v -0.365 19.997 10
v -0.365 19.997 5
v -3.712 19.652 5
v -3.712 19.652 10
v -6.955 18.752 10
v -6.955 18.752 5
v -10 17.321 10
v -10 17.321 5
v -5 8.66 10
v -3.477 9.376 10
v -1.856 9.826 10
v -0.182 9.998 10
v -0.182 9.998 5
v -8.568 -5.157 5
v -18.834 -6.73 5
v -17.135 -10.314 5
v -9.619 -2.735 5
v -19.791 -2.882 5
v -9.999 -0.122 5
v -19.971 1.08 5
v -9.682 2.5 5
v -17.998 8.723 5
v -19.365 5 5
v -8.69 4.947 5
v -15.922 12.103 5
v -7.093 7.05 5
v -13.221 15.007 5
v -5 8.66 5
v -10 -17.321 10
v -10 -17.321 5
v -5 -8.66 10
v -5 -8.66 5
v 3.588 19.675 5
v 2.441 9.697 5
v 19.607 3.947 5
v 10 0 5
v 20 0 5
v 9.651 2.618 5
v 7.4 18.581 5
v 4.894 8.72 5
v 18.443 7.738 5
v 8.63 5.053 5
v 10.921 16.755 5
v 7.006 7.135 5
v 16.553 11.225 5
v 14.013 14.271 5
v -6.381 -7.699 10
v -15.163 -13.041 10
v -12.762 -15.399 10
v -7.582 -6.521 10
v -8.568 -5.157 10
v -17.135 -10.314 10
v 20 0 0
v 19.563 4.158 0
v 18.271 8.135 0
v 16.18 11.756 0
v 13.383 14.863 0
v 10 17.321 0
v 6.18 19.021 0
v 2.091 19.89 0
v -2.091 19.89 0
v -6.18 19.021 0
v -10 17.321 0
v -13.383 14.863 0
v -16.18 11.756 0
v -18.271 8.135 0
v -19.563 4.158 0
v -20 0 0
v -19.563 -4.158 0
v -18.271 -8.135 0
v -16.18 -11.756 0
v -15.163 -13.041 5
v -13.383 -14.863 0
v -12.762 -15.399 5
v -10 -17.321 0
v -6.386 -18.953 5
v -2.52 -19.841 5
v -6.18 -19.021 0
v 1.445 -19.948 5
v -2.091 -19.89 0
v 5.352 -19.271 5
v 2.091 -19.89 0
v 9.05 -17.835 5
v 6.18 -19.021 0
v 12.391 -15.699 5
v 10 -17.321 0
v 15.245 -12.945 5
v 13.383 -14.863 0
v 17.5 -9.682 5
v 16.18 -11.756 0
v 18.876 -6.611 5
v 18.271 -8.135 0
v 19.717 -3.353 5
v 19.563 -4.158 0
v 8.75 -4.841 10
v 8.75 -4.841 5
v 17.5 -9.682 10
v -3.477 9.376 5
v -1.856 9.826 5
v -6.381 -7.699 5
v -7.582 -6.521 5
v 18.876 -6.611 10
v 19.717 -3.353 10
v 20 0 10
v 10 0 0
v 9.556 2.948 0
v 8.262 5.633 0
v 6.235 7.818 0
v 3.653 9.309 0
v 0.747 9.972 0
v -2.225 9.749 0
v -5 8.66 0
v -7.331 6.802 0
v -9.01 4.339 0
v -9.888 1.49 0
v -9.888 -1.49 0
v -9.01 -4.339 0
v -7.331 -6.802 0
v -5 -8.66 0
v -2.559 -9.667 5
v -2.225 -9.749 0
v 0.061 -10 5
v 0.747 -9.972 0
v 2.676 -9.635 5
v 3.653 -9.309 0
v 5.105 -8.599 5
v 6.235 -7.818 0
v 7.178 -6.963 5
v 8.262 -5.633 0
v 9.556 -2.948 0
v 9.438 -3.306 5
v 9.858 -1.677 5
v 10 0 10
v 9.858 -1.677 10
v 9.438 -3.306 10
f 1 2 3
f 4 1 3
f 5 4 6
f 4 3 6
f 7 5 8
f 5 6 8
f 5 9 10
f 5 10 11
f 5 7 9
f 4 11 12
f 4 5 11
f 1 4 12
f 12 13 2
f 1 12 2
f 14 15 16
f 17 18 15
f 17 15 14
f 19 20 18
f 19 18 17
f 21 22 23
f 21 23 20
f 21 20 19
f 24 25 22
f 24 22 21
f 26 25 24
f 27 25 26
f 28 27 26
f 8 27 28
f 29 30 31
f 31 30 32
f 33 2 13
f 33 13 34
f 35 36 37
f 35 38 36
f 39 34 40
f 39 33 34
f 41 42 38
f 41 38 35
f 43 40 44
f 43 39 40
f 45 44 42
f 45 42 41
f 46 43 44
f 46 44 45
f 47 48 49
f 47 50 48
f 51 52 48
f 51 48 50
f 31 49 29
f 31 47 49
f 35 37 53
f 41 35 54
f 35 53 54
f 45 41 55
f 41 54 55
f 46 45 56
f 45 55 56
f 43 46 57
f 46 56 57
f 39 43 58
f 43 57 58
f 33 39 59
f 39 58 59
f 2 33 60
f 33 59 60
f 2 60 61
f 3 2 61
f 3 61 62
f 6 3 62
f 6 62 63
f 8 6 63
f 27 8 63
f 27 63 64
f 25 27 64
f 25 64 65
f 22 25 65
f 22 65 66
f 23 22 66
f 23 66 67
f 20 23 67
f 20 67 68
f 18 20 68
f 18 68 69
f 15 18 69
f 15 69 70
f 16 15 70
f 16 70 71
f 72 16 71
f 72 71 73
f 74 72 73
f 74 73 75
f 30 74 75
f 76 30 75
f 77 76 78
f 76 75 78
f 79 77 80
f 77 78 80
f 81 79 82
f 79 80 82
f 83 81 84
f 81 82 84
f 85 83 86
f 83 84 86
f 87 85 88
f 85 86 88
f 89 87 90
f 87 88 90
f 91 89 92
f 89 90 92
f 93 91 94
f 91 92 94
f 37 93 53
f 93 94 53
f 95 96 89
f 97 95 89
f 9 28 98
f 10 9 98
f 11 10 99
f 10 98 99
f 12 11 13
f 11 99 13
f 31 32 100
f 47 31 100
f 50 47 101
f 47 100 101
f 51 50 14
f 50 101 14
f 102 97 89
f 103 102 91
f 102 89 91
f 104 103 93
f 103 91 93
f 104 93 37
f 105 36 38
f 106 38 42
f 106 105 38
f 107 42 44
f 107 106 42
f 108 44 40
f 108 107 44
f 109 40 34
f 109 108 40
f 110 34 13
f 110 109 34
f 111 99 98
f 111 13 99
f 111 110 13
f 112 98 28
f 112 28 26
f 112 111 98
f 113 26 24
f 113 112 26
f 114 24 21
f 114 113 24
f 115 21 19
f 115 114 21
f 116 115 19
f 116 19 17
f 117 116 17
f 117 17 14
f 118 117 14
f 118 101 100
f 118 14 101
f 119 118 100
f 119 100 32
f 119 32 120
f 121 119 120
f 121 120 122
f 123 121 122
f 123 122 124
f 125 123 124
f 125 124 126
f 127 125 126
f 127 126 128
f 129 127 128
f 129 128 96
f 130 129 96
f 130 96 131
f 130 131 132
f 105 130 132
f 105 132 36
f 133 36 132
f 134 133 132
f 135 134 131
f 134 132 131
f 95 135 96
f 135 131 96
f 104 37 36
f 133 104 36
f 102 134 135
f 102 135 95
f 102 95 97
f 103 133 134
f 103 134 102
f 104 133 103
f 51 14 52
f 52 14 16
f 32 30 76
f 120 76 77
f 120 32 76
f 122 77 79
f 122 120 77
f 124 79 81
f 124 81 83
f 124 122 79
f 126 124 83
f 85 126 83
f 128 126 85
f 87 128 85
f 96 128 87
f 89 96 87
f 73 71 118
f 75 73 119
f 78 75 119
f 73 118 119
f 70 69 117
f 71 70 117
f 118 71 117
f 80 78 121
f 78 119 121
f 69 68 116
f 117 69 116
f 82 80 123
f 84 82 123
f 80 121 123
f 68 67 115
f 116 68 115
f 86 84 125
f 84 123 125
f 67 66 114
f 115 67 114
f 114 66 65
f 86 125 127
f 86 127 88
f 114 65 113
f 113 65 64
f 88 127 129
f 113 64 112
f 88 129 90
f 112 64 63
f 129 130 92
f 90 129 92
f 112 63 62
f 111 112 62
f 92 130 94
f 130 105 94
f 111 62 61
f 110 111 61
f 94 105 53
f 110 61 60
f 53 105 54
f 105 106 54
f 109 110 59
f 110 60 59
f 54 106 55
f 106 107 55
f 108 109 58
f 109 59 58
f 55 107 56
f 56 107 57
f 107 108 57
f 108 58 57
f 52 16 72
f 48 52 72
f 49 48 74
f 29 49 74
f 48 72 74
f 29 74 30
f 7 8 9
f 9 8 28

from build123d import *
from build123d import SkipClean  # not in build123d's __all__

# Parameters (mm, degrees)
F0_R     = 20
F0_R_2   = 10
F1_DEPTH = 5
F3_DEPTH = 5


with BuildPart() as f1:
    # F0 (on Top) → F1 (new body)
    with BuildSketch(Plane.XY):
        Circle(F0_R)
        Circle(F0_R_2, mode=Mode.SUBTRACT)
    extrude(amount=F1_DEPTH)

    # F2 (on face) → F3 (join)
    with BuildSketch(Plane.XY.offset(5)):
        with BuildLine():
            ThreePointArc((-5, -8.6602540378), (-7.0062926922, -7.1352549156), (-8.5676274578, -5.1571076917))
            Line((-8.5676274578, -5.1571076917), (-17.1352549156, -10.3142153835))
            ThreePointArc((-17.1352549156, -10.3142153835), (-14.0125853844, -14.2705098312), (-10, -17.3205080757))
            Line((-10, -17.3205080757), (-5, -8.6602540378))
        make_face()
        with BuildLine():
            ThreePointArc((10, 0), (9.6824583655, -2.5), (8.75, -4.8412291828))
            Line((8.75, -4.8412291828), (17.5, -9.6824583655))
            ThreePointArc((17.5, -9.6824583655), (19.364916731, -5), (20, 0))
            Line((20, 0), (10, 0))
        make_face()
        with BuildLine():
            ThreePointArc((-5, 8.6602540378), (-2.6761656733, 9.6352549156), (-0.1823725422, 9.9983368745))
            Line((-0.1823725422, 9.9983368745), (-0.3647450844, 19.996673749))
            ThreePointArc((-0.3647450844, 19.996673749), (-5.3523313466, 19.2705098312), (-10, 17.3205080757))
            Line((-10, 17.3205080757), (-5, 8.6602540378))
        make_face()
    with SkipClean():  # cleaning this boolean's faces spoils the solid; the shape is the same uncleaned
        extrude(amount=F3_DEPTH)


solid = f1.part
